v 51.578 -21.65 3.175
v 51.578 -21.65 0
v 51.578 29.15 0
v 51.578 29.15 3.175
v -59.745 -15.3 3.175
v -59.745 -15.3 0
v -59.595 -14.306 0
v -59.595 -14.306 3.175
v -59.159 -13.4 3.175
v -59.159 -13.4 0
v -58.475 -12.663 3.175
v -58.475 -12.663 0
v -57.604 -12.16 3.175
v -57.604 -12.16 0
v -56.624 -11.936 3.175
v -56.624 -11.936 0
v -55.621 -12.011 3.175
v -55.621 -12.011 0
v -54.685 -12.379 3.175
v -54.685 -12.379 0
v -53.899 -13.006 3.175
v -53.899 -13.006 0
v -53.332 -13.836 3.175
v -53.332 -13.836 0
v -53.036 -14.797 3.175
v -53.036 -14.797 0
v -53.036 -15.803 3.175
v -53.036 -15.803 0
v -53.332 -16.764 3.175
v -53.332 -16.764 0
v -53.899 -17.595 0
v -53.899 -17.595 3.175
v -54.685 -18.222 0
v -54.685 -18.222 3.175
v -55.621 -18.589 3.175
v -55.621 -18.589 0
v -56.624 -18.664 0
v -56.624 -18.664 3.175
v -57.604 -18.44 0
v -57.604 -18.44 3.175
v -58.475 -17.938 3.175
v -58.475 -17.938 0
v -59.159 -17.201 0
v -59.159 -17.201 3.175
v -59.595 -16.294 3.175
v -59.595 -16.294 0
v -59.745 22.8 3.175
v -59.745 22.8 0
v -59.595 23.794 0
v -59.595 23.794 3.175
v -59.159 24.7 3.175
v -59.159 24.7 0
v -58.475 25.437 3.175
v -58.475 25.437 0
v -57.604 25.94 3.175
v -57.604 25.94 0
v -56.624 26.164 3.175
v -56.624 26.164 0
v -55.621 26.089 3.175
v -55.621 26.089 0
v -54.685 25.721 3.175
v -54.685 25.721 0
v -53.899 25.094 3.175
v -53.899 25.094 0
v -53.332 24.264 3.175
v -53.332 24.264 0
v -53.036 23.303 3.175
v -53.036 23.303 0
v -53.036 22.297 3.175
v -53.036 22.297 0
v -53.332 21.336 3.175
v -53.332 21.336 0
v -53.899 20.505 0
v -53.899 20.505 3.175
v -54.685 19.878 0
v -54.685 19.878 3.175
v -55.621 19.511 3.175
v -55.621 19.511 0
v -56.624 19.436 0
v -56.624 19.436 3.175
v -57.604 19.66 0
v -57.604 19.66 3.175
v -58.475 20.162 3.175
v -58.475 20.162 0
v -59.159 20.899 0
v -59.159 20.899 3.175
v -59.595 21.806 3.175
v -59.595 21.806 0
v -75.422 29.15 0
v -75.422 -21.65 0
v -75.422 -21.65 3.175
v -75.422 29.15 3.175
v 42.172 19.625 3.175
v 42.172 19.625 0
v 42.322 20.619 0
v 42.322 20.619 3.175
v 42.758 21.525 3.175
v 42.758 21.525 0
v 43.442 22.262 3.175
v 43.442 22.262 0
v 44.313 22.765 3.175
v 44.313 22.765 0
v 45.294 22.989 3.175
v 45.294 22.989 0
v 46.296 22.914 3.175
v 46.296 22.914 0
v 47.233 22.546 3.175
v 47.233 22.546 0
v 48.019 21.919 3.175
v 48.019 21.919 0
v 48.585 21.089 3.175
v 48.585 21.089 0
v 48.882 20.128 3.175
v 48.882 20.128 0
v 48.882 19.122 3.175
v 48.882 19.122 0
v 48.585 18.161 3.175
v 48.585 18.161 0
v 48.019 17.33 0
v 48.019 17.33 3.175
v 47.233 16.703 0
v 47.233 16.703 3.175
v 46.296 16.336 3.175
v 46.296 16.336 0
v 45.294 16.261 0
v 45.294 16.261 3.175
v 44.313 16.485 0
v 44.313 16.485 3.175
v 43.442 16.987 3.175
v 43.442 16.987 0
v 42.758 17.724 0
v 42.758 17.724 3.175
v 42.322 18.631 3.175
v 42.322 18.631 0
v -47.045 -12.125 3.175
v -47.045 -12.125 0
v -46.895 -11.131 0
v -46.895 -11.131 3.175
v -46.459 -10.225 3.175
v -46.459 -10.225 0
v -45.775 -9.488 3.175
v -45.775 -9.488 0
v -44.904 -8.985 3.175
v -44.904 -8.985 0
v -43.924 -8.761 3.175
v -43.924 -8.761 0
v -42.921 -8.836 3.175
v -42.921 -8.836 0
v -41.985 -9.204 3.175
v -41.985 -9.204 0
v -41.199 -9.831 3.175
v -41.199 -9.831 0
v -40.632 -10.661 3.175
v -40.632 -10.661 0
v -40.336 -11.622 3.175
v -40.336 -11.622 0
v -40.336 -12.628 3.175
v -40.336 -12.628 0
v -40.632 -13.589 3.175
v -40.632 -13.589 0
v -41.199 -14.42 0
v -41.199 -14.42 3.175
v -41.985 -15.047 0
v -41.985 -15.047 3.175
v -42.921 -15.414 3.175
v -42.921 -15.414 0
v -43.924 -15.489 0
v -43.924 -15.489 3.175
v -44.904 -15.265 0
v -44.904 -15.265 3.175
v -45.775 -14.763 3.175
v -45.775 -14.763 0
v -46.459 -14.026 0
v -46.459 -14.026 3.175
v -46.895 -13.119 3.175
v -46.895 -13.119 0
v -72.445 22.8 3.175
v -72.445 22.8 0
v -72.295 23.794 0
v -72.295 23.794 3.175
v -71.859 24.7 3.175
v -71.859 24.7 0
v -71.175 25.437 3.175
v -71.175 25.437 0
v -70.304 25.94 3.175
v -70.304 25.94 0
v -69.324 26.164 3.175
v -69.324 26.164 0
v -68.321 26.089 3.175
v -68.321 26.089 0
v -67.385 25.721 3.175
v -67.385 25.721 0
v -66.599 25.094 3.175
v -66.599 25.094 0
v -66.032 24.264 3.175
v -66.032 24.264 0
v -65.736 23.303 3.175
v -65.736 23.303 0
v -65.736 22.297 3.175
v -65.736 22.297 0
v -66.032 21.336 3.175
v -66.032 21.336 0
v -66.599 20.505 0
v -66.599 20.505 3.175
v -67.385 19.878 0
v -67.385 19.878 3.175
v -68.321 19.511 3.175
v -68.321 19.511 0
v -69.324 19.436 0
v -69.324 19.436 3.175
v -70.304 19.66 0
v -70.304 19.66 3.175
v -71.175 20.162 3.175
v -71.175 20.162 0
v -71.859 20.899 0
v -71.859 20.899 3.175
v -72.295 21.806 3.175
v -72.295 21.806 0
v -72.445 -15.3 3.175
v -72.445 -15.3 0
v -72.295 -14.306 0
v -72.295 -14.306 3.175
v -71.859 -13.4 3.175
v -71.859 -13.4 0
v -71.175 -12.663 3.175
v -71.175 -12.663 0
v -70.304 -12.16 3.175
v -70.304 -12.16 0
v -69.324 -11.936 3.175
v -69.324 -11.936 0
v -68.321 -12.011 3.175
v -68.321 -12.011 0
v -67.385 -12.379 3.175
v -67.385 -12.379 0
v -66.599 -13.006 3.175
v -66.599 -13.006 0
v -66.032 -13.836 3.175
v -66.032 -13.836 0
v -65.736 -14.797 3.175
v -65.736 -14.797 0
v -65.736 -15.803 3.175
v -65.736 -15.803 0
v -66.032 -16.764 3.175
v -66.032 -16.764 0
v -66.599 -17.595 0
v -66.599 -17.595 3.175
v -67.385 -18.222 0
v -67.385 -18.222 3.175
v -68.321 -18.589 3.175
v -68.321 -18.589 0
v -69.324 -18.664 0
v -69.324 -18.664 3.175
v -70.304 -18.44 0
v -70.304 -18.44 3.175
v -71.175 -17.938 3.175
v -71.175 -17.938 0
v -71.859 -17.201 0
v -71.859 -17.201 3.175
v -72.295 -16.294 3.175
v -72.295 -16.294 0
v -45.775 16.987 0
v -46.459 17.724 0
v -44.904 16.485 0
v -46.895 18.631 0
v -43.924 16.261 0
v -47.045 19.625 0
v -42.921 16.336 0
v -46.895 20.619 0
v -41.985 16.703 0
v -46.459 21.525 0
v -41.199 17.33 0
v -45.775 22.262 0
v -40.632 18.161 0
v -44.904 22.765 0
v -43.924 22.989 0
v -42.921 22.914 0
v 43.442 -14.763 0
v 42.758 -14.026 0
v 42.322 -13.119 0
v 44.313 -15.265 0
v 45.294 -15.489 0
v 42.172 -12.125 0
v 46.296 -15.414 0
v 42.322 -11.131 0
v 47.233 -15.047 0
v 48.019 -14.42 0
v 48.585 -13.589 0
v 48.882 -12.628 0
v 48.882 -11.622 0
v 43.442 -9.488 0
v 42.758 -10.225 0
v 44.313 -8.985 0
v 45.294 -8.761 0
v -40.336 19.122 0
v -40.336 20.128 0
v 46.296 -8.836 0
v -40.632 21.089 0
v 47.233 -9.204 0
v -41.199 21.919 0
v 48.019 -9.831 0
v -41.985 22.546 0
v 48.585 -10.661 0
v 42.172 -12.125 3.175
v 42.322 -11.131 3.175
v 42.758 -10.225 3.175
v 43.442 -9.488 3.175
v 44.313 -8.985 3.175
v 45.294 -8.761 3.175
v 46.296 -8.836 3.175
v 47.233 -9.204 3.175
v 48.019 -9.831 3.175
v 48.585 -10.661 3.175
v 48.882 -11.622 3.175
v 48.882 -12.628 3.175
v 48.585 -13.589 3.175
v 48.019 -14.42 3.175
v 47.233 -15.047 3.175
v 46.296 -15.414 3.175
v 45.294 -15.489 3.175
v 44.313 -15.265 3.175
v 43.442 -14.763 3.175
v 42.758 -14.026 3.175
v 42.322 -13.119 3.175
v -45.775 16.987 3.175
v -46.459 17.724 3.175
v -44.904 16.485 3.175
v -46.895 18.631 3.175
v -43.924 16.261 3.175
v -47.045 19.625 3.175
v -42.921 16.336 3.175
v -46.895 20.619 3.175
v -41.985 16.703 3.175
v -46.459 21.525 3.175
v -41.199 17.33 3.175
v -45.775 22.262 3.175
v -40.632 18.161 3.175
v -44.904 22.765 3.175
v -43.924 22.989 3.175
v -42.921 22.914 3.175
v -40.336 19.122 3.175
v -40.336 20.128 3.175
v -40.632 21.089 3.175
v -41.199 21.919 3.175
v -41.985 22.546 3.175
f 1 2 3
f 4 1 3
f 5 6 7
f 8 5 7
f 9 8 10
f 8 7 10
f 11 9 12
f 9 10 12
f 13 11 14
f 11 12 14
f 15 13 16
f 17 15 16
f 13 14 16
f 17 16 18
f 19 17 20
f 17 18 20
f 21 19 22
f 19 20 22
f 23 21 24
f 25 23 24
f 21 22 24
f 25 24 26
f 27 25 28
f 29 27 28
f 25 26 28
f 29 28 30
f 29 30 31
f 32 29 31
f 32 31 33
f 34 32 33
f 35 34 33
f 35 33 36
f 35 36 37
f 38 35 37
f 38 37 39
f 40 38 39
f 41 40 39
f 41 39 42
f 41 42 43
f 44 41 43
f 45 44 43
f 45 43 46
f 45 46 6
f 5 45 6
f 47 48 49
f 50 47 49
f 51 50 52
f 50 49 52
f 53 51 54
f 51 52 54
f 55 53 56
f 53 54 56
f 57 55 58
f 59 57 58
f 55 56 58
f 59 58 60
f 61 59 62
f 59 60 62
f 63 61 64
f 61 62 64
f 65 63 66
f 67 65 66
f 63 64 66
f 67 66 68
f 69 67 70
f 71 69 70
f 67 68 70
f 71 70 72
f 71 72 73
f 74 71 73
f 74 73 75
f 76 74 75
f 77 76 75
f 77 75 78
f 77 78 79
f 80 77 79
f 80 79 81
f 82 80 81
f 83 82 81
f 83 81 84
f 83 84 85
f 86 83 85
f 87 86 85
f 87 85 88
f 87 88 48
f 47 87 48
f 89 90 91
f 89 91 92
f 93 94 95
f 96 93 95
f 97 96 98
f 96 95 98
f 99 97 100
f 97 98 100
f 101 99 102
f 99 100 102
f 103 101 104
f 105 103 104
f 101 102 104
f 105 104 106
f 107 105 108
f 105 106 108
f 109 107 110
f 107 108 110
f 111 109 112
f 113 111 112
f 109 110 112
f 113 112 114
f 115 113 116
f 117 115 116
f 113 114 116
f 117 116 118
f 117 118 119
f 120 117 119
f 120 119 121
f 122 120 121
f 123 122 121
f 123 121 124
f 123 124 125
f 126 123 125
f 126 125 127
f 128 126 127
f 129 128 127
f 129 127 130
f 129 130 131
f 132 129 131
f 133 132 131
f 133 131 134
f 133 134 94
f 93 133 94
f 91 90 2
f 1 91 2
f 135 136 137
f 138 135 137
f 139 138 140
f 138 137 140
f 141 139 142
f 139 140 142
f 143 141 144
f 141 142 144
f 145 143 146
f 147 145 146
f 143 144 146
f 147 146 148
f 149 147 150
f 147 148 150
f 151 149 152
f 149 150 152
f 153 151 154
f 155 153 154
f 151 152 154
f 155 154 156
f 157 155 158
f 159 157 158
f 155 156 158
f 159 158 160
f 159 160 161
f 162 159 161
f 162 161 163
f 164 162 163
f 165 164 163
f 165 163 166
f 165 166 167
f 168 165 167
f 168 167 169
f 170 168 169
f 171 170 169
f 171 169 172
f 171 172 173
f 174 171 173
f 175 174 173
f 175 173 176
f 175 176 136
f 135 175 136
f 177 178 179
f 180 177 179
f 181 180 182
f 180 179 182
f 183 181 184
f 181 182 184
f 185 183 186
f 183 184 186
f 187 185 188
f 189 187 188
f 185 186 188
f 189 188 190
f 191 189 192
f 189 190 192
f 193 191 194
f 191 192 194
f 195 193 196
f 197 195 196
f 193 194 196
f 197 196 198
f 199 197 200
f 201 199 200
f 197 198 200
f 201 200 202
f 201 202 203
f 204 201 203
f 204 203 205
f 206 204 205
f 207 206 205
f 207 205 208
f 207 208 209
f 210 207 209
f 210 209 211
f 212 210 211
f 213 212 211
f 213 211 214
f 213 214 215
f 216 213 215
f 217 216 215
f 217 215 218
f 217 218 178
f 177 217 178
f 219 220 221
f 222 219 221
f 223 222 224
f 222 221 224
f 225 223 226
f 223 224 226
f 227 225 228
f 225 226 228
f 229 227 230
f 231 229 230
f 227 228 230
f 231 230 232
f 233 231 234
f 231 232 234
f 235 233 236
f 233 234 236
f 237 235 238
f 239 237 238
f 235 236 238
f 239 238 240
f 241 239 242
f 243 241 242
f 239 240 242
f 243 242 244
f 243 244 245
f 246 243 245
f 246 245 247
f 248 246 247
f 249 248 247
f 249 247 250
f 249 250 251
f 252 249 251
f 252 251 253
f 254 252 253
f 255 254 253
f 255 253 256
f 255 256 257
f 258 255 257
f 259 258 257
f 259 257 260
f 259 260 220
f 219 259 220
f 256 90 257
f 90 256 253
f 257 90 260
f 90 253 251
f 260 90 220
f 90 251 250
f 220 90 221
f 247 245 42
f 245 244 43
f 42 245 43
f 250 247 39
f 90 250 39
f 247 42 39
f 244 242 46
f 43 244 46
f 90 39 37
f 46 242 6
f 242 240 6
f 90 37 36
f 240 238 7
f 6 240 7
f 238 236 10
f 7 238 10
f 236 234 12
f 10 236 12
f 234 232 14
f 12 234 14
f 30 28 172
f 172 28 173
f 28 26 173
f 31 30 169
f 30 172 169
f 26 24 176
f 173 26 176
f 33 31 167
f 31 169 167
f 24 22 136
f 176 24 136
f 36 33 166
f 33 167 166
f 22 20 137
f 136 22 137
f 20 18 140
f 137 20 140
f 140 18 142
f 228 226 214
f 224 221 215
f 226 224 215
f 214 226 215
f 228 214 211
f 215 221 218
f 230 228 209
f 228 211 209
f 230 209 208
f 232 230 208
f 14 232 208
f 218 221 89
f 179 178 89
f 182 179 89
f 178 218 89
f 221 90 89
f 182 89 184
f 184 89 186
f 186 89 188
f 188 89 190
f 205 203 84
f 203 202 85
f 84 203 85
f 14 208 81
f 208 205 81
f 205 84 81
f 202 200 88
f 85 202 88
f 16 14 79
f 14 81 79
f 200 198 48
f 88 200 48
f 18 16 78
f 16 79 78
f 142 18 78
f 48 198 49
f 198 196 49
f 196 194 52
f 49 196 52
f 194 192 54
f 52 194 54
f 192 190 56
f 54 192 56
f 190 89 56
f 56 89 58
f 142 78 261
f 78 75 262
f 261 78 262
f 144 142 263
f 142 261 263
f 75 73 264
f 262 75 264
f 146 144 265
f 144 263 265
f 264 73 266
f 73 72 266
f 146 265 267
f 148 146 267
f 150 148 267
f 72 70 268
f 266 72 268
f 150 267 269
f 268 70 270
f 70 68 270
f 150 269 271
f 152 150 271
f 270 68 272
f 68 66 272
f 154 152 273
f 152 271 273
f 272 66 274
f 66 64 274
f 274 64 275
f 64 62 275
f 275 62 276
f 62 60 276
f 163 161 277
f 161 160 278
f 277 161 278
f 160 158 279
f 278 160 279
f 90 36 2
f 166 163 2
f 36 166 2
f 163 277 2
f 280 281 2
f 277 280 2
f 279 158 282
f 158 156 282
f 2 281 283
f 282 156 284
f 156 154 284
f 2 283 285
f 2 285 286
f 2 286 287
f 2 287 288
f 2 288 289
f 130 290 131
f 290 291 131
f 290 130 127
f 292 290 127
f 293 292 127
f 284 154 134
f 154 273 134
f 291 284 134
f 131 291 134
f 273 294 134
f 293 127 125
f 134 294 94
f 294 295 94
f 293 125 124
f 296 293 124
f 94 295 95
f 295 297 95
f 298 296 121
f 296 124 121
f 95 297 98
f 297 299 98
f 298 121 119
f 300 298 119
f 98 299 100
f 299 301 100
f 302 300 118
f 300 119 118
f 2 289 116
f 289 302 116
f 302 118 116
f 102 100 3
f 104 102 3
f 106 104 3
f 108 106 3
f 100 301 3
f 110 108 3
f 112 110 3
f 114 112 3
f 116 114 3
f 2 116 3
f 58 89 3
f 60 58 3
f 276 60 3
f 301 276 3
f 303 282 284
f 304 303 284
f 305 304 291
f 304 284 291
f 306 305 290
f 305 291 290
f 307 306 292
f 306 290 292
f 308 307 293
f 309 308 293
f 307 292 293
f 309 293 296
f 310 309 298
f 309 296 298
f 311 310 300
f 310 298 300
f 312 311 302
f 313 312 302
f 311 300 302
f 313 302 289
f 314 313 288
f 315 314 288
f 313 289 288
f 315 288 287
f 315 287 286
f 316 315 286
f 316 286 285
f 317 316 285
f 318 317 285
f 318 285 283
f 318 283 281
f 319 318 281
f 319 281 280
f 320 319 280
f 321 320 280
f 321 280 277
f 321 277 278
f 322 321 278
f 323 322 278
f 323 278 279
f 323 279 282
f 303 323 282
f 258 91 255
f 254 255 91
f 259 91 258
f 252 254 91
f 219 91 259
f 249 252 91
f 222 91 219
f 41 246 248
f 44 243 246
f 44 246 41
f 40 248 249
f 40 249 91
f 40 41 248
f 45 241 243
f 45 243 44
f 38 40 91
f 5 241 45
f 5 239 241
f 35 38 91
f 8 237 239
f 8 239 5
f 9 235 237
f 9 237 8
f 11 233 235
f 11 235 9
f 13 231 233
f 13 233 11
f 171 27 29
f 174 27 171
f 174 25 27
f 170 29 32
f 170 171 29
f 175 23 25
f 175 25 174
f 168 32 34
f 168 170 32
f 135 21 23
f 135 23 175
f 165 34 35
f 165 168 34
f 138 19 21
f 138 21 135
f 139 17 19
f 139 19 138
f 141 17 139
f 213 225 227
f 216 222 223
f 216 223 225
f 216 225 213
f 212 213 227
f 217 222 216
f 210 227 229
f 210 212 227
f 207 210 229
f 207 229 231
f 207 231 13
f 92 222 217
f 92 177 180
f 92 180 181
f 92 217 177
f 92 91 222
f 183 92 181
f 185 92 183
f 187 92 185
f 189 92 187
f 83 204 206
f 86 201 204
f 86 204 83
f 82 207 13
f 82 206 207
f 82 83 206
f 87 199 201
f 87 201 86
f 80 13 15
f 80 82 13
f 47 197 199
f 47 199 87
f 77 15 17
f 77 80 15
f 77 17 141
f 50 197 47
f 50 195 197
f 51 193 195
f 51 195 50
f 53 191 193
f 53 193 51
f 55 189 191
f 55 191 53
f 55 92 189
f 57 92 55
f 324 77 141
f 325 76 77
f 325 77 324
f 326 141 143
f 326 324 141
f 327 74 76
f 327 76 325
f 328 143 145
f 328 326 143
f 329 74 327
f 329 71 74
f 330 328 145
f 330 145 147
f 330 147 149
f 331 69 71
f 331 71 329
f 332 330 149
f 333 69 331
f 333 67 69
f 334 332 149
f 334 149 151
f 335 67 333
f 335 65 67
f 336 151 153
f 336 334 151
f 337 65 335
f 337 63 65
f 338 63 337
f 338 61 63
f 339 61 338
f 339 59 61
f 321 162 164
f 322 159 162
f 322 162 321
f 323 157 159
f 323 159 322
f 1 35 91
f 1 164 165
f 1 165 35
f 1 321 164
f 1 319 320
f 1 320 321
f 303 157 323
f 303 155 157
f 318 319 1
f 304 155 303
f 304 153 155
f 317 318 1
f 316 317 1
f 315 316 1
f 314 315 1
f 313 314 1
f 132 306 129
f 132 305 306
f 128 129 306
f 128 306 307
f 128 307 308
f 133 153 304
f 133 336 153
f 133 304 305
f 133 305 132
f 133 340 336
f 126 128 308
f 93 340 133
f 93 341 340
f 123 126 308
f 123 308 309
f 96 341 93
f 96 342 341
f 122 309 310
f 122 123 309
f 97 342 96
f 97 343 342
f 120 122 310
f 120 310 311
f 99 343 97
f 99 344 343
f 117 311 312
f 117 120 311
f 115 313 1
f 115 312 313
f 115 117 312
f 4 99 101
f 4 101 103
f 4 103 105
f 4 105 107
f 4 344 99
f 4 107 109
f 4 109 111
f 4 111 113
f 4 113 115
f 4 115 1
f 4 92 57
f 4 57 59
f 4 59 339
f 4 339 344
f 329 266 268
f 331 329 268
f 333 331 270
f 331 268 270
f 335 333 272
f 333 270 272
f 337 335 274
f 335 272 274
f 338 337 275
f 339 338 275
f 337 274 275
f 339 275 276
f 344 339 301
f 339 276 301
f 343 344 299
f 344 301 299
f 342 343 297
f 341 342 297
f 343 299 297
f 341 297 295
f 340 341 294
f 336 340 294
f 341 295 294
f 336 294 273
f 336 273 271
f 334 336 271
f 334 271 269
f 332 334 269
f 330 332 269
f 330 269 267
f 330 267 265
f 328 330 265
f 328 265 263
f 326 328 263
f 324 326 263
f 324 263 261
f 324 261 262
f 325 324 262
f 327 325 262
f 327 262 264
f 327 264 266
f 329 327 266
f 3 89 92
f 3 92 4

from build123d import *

# Parameters (mm, degrees)
SKETCH1_W                        = 127
SKETCH1_H                        = 50.8
BOSS_EXTRUDE1_DEPTH              = 3.175
F_17_64_0_26563_DIAMETER_HOLE1_D = 6.747002
F_17_64_0_26563_DIAMETER_HOLE2_D = 6.747002


with BuildPart() as part:
    # Sketch1 → Boss-Extrude1 (new body)
    with BuildSketch(Plane.XY):
        with Locations((-11.921727019, 3.749860724)):
            Rectangle(SKETCH1_W, SKETCH1_H)
    extrude(amount=BOSS_EXTRUDE1_DEPTH)

    # 17/64 (0.26563) Diameter Hole1 (through all)
    with Locations(Plane(origin=(-43.671727019, 19.624860724, 3.175), x_dir=(1, 0, 0), z_dir=(0, 0, 1))):
        with Locations((0, 0), (0, -31.75), (89.2175, 0), (89.2175, -31.75)):
            Hole(F_17_64_0_26563_DIAMETER_HOLE1_D / 2)

    # 17/64 (0.26563) Diameter Hole2 (through all)
    with Locations(Plane(origin=(-69.071727019, 22.799860724, 3.175), x_dir=(1, 0, 0), z_dir=(0, 0, 1))):
        with Locations((0, 0), (12.7, 0), (12.7, -38.1), (0, -38.1)):
            Hole(F_17_64_0_26563_DIAMETER_HOLE2_D / 2)


solid = part.part
